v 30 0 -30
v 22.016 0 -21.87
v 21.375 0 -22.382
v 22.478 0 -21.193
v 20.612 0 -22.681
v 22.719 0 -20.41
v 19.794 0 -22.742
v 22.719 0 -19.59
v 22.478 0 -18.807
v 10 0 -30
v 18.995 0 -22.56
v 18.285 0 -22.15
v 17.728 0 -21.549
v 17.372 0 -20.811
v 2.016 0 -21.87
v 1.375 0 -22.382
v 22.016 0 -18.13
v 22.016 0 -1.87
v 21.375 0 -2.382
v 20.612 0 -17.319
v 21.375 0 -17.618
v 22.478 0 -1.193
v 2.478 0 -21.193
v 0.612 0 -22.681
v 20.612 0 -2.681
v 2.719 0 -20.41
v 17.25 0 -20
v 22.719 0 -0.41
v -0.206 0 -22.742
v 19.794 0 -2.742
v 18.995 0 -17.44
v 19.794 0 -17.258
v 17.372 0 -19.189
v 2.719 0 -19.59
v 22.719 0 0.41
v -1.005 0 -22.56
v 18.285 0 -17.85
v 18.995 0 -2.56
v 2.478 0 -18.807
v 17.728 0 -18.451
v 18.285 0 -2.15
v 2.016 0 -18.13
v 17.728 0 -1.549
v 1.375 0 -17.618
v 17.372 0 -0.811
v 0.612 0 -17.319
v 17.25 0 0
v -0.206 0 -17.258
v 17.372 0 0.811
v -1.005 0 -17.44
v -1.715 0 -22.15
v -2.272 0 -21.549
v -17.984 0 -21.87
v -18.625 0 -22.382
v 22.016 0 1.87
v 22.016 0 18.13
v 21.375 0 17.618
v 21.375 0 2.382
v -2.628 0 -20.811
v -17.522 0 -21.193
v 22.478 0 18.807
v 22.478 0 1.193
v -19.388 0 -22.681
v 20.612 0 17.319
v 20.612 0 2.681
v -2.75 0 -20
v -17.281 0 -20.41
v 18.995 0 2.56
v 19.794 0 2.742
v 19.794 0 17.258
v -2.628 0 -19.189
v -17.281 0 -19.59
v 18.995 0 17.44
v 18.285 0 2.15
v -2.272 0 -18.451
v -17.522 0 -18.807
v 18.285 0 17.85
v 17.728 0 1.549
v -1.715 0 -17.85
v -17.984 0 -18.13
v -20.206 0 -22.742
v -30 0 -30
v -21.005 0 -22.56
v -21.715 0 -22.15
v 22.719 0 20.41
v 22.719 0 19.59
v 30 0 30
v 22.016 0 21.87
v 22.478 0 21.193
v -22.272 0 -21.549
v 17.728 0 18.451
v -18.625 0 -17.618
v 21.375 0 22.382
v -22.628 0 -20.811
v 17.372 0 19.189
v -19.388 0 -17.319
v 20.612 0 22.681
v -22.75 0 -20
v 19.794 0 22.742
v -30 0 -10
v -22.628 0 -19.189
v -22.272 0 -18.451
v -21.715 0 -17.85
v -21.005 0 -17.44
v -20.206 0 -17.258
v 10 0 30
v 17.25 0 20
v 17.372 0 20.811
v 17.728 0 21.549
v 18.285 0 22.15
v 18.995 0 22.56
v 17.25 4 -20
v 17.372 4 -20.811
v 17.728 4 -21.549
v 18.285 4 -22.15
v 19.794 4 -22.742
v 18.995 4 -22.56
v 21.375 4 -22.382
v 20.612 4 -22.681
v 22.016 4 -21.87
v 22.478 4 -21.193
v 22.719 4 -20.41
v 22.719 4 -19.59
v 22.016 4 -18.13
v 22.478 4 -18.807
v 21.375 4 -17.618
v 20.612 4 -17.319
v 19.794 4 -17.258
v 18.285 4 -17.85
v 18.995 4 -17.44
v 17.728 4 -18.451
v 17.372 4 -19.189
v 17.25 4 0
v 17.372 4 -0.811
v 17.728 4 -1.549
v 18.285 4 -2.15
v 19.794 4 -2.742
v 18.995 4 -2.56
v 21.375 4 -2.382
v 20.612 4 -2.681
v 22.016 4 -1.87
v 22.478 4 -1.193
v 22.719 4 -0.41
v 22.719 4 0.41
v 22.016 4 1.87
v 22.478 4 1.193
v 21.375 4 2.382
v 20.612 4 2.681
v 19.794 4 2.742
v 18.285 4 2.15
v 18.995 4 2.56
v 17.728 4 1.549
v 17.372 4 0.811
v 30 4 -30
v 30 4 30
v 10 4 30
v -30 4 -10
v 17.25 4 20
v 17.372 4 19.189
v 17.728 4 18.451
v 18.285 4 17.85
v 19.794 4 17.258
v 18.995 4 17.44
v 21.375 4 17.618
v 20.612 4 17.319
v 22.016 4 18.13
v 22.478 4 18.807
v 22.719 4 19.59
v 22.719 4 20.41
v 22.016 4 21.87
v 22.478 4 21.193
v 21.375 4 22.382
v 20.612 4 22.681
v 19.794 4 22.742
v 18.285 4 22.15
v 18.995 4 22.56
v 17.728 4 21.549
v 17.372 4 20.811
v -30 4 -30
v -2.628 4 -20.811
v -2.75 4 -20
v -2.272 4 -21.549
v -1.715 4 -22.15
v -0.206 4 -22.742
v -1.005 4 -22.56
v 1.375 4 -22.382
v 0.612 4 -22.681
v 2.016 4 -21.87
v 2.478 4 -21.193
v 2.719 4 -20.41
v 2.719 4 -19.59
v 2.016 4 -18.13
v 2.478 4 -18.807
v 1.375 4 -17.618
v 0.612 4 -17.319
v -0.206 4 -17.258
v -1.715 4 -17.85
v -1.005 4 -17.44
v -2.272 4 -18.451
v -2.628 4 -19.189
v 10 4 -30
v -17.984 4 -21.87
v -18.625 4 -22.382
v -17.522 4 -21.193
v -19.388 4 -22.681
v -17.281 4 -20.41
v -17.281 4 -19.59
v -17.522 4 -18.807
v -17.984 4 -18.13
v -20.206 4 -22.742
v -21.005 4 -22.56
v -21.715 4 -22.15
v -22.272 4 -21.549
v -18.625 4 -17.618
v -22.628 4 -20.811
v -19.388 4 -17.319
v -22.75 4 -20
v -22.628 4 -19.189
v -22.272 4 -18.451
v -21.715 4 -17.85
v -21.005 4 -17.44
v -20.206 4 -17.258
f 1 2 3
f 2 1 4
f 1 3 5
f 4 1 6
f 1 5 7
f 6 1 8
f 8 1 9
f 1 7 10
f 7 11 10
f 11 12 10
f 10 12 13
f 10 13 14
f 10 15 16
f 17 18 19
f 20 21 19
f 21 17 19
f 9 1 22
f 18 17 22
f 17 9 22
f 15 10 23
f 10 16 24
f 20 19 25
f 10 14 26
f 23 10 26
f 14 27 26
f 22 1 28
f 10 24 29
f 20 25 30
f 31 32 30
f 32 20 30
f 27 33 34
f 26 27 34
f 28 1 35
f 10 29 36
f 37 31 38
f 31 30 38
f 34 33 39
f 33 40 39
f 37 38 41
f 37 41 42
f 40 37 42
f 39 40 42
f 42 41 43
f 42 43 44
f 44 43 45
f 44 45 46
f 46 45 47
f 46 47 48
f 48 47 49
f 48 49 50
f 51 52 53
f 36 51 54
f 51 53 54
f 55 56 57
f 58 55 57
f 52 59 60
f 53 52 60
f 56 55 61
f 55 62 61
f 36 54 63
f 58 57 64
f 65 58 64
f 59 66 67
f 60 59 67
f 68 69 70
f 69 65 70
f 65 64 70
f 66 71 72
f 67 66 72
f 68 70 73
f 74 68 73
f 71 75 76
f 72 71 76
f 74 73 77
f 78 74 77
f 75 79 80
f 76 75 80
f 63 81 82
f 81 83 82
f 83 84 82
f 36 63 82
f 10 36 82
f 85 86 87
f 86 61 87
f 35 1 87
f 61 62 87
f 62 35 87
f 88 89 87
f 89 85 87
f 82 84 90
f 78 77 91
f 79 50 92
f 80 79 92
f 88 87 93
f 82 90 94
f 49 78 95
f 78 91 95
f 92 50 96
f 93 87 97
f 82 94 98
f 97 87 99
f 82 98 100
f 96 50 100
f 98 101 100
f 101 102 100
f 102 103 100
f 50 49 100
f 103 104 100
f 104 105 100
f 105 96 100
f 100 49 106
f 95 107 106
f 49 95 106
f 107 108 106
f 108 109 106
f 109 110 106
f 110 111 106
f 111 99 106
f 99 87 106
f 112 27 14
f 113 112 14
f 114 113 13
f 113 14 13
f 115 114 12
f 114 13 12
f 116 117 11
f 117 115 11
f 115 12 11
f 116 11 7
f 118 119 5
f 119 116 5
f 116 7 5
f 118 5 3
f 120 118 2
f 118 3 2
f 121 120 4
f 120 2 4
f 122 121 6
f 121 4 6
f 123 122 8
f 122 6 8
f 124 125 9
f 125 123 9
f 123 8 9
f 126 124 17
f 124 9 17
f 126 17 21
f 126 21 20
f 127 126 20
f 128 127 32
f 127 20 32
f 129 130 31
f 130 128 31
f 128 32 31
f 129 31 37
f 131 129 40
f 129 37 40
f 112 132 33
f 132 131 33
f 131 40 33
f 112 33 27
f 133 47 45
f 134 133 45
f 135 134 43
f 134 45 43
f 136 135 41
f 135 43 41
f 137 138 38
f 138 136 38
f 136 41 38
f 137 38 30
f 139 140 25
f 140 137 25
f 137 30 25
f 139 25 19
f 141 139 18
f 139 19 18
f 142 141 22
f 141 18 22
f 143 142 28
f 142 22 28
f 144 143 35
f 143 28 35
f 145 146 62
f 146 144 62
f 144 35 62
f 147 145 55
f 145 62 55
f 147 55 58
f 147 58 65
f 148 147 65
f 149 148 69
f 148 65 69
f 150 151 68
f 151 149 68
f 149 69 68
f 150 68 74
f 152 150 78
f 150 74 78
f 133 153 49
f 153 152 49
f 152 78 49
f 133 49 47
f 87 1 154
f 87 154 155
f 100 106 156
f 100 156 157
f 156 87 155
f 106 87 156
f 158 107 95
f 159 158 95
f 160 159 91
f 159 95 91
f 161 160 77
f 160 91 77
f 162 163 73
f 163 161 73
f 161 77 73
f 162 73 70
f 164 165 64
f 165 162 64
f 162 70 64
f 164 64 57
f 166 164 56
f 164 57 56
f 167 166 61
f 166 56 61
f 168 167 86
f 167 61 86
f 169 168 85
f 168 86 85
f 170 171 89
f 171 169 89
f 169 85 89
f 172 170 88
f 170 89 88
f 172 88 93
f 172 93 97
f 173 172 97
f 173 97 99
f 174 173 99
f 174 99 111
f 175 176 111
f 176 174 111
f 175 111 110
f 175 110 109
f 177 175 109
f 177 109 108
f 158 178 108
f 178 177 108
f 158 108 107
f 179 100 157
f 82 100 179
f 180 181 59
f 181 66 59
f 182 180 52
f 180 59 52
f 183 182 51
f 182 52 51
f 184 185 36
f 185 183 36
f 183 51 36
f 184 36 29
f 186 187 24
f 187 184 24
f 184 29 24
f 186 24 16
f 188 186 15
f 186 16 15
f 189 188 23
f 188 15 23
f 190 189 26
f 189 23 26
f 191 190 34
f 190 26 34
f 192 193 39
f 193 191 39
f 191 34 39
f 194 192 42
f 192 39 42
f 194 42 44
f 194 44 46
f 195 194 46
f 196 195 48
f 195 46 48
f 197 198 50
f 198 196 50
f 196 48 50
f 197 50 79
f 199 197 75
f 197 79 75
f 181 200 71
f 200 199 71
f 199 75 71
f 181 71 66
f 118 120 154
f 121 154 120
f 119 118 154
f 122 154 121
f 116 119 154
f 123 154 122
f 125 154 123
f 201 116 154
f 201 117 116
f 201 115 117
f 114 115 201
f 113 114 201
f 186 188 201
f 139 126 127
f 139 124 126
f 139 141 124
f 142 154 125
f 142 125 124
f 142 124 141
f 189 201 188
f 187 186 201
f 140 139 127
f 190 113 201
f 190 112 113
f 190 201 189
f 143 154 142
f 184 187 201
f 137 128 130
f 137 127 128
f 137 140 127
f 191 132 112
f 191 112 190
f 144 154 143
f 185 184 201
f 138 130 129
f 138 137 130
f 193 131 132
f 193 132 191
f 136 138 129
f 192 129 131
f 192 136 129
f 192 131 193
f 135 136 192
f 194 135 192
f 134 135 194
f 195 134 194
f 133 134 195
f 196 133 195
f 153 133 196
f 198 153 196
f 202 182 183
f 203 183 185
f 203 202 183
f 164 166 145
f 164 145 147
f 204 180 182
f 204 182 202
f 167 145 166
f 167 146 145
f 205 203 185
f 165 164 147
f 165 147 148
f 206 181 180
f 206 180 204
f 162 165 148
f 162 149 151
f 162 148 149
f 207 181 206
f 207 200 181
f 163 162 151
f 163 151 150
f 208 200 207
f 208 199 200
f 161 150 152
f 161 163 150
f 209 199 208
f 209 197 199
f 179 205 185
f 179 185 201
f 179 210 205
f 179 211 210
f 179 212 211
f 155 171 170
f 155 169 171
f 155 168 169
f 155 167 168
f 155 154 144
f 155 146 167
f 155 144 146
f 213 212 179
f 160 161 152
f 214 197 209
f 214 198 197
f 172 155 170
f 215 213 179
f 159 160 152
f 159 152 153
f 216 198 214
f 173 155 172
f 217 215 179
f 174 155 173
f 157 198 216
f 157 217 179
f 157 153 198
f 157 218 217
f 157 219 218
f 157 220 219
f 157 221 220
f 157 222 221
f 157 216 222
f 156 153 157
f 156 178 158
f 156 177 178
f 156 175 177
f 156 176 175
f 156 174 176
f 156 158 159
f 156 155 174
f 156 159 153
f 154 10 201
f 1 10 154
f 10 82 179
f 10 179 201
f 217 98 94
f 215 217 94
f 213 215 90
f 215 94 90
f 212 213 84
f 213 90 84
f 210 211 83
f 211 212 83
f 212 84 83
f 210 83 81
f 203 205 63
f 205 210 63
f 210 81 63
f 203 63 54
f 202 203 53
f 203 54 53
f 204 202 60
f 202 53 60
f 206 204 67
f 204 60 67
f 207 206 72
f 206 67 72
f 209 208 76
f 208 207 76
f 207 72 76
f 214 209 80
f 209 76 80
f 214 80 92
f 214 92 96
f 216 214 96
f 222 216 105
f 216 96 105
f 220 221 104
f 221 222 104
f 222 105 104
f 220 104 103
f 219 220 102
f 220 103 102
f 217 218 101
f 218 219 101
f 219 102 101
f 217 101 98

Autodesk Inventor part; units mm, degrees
ref_plane "YZ Plane" through (0, 0, 0) normal (1, 0, 0) x (0, 1, 0)
ref_plane "XZ Plane" through (0, 0, 0) normal (0, 1, 0) x (-1, 0, 0)
ref_plane "XY Plane" through (0, 0, 0) normal (0, 0, 1) x (1, 0, 0)
sketch "Sketch1" plane through (0, 0, 0) normal (0, 1, 0) x (-1, 0, 0)
  line L0 (-30, 30) -> (-10, 30)
  line L1 (30, -10) -> (30, -30)
  line L2 (30, -30) -> (-30, -30)
  line L3 (-30, -30) -> (-30, 30)
  line L4 (-30, 30) -> (30, -30) construction
  line L5 (30, 30) -> (-30, -30) construction
  line L6 (-30, 30) -> (-10, 30)
  line L7 (-10, -30) -> (-30, -30)
  line L8 (-30, -30) -> (-30, 30)
  line L9 (30, -30) -> (-10, -30)
  line L10 (30, -10) -> (30, -30)
  line L11 (-10, 30) -> (30, -10)
  circle A0 centre (-20, -20) radius 2.75
  circle A1 centre (-20, 0) radius 2.75
  circle A2 centre (-20, 20) radius 2.75
  circle A3 centre (0, -20) radius 2.75
  circle A4 centre (20, -20) radius 2.75
  point P0 (0, 0)
  dimension "d0" = 60
  dimension "d1" = 60
  dimension "d4" = 5.5
  dimension "d5" = 5.5
  dimension "d6" = 5.5
  dimension "d7" = 5.5
  dimension "d8" = 5.5
extrude "Extrusion1" add sketch "Sketch1" along normal blind 4
properties part number "2020-90-plate"
